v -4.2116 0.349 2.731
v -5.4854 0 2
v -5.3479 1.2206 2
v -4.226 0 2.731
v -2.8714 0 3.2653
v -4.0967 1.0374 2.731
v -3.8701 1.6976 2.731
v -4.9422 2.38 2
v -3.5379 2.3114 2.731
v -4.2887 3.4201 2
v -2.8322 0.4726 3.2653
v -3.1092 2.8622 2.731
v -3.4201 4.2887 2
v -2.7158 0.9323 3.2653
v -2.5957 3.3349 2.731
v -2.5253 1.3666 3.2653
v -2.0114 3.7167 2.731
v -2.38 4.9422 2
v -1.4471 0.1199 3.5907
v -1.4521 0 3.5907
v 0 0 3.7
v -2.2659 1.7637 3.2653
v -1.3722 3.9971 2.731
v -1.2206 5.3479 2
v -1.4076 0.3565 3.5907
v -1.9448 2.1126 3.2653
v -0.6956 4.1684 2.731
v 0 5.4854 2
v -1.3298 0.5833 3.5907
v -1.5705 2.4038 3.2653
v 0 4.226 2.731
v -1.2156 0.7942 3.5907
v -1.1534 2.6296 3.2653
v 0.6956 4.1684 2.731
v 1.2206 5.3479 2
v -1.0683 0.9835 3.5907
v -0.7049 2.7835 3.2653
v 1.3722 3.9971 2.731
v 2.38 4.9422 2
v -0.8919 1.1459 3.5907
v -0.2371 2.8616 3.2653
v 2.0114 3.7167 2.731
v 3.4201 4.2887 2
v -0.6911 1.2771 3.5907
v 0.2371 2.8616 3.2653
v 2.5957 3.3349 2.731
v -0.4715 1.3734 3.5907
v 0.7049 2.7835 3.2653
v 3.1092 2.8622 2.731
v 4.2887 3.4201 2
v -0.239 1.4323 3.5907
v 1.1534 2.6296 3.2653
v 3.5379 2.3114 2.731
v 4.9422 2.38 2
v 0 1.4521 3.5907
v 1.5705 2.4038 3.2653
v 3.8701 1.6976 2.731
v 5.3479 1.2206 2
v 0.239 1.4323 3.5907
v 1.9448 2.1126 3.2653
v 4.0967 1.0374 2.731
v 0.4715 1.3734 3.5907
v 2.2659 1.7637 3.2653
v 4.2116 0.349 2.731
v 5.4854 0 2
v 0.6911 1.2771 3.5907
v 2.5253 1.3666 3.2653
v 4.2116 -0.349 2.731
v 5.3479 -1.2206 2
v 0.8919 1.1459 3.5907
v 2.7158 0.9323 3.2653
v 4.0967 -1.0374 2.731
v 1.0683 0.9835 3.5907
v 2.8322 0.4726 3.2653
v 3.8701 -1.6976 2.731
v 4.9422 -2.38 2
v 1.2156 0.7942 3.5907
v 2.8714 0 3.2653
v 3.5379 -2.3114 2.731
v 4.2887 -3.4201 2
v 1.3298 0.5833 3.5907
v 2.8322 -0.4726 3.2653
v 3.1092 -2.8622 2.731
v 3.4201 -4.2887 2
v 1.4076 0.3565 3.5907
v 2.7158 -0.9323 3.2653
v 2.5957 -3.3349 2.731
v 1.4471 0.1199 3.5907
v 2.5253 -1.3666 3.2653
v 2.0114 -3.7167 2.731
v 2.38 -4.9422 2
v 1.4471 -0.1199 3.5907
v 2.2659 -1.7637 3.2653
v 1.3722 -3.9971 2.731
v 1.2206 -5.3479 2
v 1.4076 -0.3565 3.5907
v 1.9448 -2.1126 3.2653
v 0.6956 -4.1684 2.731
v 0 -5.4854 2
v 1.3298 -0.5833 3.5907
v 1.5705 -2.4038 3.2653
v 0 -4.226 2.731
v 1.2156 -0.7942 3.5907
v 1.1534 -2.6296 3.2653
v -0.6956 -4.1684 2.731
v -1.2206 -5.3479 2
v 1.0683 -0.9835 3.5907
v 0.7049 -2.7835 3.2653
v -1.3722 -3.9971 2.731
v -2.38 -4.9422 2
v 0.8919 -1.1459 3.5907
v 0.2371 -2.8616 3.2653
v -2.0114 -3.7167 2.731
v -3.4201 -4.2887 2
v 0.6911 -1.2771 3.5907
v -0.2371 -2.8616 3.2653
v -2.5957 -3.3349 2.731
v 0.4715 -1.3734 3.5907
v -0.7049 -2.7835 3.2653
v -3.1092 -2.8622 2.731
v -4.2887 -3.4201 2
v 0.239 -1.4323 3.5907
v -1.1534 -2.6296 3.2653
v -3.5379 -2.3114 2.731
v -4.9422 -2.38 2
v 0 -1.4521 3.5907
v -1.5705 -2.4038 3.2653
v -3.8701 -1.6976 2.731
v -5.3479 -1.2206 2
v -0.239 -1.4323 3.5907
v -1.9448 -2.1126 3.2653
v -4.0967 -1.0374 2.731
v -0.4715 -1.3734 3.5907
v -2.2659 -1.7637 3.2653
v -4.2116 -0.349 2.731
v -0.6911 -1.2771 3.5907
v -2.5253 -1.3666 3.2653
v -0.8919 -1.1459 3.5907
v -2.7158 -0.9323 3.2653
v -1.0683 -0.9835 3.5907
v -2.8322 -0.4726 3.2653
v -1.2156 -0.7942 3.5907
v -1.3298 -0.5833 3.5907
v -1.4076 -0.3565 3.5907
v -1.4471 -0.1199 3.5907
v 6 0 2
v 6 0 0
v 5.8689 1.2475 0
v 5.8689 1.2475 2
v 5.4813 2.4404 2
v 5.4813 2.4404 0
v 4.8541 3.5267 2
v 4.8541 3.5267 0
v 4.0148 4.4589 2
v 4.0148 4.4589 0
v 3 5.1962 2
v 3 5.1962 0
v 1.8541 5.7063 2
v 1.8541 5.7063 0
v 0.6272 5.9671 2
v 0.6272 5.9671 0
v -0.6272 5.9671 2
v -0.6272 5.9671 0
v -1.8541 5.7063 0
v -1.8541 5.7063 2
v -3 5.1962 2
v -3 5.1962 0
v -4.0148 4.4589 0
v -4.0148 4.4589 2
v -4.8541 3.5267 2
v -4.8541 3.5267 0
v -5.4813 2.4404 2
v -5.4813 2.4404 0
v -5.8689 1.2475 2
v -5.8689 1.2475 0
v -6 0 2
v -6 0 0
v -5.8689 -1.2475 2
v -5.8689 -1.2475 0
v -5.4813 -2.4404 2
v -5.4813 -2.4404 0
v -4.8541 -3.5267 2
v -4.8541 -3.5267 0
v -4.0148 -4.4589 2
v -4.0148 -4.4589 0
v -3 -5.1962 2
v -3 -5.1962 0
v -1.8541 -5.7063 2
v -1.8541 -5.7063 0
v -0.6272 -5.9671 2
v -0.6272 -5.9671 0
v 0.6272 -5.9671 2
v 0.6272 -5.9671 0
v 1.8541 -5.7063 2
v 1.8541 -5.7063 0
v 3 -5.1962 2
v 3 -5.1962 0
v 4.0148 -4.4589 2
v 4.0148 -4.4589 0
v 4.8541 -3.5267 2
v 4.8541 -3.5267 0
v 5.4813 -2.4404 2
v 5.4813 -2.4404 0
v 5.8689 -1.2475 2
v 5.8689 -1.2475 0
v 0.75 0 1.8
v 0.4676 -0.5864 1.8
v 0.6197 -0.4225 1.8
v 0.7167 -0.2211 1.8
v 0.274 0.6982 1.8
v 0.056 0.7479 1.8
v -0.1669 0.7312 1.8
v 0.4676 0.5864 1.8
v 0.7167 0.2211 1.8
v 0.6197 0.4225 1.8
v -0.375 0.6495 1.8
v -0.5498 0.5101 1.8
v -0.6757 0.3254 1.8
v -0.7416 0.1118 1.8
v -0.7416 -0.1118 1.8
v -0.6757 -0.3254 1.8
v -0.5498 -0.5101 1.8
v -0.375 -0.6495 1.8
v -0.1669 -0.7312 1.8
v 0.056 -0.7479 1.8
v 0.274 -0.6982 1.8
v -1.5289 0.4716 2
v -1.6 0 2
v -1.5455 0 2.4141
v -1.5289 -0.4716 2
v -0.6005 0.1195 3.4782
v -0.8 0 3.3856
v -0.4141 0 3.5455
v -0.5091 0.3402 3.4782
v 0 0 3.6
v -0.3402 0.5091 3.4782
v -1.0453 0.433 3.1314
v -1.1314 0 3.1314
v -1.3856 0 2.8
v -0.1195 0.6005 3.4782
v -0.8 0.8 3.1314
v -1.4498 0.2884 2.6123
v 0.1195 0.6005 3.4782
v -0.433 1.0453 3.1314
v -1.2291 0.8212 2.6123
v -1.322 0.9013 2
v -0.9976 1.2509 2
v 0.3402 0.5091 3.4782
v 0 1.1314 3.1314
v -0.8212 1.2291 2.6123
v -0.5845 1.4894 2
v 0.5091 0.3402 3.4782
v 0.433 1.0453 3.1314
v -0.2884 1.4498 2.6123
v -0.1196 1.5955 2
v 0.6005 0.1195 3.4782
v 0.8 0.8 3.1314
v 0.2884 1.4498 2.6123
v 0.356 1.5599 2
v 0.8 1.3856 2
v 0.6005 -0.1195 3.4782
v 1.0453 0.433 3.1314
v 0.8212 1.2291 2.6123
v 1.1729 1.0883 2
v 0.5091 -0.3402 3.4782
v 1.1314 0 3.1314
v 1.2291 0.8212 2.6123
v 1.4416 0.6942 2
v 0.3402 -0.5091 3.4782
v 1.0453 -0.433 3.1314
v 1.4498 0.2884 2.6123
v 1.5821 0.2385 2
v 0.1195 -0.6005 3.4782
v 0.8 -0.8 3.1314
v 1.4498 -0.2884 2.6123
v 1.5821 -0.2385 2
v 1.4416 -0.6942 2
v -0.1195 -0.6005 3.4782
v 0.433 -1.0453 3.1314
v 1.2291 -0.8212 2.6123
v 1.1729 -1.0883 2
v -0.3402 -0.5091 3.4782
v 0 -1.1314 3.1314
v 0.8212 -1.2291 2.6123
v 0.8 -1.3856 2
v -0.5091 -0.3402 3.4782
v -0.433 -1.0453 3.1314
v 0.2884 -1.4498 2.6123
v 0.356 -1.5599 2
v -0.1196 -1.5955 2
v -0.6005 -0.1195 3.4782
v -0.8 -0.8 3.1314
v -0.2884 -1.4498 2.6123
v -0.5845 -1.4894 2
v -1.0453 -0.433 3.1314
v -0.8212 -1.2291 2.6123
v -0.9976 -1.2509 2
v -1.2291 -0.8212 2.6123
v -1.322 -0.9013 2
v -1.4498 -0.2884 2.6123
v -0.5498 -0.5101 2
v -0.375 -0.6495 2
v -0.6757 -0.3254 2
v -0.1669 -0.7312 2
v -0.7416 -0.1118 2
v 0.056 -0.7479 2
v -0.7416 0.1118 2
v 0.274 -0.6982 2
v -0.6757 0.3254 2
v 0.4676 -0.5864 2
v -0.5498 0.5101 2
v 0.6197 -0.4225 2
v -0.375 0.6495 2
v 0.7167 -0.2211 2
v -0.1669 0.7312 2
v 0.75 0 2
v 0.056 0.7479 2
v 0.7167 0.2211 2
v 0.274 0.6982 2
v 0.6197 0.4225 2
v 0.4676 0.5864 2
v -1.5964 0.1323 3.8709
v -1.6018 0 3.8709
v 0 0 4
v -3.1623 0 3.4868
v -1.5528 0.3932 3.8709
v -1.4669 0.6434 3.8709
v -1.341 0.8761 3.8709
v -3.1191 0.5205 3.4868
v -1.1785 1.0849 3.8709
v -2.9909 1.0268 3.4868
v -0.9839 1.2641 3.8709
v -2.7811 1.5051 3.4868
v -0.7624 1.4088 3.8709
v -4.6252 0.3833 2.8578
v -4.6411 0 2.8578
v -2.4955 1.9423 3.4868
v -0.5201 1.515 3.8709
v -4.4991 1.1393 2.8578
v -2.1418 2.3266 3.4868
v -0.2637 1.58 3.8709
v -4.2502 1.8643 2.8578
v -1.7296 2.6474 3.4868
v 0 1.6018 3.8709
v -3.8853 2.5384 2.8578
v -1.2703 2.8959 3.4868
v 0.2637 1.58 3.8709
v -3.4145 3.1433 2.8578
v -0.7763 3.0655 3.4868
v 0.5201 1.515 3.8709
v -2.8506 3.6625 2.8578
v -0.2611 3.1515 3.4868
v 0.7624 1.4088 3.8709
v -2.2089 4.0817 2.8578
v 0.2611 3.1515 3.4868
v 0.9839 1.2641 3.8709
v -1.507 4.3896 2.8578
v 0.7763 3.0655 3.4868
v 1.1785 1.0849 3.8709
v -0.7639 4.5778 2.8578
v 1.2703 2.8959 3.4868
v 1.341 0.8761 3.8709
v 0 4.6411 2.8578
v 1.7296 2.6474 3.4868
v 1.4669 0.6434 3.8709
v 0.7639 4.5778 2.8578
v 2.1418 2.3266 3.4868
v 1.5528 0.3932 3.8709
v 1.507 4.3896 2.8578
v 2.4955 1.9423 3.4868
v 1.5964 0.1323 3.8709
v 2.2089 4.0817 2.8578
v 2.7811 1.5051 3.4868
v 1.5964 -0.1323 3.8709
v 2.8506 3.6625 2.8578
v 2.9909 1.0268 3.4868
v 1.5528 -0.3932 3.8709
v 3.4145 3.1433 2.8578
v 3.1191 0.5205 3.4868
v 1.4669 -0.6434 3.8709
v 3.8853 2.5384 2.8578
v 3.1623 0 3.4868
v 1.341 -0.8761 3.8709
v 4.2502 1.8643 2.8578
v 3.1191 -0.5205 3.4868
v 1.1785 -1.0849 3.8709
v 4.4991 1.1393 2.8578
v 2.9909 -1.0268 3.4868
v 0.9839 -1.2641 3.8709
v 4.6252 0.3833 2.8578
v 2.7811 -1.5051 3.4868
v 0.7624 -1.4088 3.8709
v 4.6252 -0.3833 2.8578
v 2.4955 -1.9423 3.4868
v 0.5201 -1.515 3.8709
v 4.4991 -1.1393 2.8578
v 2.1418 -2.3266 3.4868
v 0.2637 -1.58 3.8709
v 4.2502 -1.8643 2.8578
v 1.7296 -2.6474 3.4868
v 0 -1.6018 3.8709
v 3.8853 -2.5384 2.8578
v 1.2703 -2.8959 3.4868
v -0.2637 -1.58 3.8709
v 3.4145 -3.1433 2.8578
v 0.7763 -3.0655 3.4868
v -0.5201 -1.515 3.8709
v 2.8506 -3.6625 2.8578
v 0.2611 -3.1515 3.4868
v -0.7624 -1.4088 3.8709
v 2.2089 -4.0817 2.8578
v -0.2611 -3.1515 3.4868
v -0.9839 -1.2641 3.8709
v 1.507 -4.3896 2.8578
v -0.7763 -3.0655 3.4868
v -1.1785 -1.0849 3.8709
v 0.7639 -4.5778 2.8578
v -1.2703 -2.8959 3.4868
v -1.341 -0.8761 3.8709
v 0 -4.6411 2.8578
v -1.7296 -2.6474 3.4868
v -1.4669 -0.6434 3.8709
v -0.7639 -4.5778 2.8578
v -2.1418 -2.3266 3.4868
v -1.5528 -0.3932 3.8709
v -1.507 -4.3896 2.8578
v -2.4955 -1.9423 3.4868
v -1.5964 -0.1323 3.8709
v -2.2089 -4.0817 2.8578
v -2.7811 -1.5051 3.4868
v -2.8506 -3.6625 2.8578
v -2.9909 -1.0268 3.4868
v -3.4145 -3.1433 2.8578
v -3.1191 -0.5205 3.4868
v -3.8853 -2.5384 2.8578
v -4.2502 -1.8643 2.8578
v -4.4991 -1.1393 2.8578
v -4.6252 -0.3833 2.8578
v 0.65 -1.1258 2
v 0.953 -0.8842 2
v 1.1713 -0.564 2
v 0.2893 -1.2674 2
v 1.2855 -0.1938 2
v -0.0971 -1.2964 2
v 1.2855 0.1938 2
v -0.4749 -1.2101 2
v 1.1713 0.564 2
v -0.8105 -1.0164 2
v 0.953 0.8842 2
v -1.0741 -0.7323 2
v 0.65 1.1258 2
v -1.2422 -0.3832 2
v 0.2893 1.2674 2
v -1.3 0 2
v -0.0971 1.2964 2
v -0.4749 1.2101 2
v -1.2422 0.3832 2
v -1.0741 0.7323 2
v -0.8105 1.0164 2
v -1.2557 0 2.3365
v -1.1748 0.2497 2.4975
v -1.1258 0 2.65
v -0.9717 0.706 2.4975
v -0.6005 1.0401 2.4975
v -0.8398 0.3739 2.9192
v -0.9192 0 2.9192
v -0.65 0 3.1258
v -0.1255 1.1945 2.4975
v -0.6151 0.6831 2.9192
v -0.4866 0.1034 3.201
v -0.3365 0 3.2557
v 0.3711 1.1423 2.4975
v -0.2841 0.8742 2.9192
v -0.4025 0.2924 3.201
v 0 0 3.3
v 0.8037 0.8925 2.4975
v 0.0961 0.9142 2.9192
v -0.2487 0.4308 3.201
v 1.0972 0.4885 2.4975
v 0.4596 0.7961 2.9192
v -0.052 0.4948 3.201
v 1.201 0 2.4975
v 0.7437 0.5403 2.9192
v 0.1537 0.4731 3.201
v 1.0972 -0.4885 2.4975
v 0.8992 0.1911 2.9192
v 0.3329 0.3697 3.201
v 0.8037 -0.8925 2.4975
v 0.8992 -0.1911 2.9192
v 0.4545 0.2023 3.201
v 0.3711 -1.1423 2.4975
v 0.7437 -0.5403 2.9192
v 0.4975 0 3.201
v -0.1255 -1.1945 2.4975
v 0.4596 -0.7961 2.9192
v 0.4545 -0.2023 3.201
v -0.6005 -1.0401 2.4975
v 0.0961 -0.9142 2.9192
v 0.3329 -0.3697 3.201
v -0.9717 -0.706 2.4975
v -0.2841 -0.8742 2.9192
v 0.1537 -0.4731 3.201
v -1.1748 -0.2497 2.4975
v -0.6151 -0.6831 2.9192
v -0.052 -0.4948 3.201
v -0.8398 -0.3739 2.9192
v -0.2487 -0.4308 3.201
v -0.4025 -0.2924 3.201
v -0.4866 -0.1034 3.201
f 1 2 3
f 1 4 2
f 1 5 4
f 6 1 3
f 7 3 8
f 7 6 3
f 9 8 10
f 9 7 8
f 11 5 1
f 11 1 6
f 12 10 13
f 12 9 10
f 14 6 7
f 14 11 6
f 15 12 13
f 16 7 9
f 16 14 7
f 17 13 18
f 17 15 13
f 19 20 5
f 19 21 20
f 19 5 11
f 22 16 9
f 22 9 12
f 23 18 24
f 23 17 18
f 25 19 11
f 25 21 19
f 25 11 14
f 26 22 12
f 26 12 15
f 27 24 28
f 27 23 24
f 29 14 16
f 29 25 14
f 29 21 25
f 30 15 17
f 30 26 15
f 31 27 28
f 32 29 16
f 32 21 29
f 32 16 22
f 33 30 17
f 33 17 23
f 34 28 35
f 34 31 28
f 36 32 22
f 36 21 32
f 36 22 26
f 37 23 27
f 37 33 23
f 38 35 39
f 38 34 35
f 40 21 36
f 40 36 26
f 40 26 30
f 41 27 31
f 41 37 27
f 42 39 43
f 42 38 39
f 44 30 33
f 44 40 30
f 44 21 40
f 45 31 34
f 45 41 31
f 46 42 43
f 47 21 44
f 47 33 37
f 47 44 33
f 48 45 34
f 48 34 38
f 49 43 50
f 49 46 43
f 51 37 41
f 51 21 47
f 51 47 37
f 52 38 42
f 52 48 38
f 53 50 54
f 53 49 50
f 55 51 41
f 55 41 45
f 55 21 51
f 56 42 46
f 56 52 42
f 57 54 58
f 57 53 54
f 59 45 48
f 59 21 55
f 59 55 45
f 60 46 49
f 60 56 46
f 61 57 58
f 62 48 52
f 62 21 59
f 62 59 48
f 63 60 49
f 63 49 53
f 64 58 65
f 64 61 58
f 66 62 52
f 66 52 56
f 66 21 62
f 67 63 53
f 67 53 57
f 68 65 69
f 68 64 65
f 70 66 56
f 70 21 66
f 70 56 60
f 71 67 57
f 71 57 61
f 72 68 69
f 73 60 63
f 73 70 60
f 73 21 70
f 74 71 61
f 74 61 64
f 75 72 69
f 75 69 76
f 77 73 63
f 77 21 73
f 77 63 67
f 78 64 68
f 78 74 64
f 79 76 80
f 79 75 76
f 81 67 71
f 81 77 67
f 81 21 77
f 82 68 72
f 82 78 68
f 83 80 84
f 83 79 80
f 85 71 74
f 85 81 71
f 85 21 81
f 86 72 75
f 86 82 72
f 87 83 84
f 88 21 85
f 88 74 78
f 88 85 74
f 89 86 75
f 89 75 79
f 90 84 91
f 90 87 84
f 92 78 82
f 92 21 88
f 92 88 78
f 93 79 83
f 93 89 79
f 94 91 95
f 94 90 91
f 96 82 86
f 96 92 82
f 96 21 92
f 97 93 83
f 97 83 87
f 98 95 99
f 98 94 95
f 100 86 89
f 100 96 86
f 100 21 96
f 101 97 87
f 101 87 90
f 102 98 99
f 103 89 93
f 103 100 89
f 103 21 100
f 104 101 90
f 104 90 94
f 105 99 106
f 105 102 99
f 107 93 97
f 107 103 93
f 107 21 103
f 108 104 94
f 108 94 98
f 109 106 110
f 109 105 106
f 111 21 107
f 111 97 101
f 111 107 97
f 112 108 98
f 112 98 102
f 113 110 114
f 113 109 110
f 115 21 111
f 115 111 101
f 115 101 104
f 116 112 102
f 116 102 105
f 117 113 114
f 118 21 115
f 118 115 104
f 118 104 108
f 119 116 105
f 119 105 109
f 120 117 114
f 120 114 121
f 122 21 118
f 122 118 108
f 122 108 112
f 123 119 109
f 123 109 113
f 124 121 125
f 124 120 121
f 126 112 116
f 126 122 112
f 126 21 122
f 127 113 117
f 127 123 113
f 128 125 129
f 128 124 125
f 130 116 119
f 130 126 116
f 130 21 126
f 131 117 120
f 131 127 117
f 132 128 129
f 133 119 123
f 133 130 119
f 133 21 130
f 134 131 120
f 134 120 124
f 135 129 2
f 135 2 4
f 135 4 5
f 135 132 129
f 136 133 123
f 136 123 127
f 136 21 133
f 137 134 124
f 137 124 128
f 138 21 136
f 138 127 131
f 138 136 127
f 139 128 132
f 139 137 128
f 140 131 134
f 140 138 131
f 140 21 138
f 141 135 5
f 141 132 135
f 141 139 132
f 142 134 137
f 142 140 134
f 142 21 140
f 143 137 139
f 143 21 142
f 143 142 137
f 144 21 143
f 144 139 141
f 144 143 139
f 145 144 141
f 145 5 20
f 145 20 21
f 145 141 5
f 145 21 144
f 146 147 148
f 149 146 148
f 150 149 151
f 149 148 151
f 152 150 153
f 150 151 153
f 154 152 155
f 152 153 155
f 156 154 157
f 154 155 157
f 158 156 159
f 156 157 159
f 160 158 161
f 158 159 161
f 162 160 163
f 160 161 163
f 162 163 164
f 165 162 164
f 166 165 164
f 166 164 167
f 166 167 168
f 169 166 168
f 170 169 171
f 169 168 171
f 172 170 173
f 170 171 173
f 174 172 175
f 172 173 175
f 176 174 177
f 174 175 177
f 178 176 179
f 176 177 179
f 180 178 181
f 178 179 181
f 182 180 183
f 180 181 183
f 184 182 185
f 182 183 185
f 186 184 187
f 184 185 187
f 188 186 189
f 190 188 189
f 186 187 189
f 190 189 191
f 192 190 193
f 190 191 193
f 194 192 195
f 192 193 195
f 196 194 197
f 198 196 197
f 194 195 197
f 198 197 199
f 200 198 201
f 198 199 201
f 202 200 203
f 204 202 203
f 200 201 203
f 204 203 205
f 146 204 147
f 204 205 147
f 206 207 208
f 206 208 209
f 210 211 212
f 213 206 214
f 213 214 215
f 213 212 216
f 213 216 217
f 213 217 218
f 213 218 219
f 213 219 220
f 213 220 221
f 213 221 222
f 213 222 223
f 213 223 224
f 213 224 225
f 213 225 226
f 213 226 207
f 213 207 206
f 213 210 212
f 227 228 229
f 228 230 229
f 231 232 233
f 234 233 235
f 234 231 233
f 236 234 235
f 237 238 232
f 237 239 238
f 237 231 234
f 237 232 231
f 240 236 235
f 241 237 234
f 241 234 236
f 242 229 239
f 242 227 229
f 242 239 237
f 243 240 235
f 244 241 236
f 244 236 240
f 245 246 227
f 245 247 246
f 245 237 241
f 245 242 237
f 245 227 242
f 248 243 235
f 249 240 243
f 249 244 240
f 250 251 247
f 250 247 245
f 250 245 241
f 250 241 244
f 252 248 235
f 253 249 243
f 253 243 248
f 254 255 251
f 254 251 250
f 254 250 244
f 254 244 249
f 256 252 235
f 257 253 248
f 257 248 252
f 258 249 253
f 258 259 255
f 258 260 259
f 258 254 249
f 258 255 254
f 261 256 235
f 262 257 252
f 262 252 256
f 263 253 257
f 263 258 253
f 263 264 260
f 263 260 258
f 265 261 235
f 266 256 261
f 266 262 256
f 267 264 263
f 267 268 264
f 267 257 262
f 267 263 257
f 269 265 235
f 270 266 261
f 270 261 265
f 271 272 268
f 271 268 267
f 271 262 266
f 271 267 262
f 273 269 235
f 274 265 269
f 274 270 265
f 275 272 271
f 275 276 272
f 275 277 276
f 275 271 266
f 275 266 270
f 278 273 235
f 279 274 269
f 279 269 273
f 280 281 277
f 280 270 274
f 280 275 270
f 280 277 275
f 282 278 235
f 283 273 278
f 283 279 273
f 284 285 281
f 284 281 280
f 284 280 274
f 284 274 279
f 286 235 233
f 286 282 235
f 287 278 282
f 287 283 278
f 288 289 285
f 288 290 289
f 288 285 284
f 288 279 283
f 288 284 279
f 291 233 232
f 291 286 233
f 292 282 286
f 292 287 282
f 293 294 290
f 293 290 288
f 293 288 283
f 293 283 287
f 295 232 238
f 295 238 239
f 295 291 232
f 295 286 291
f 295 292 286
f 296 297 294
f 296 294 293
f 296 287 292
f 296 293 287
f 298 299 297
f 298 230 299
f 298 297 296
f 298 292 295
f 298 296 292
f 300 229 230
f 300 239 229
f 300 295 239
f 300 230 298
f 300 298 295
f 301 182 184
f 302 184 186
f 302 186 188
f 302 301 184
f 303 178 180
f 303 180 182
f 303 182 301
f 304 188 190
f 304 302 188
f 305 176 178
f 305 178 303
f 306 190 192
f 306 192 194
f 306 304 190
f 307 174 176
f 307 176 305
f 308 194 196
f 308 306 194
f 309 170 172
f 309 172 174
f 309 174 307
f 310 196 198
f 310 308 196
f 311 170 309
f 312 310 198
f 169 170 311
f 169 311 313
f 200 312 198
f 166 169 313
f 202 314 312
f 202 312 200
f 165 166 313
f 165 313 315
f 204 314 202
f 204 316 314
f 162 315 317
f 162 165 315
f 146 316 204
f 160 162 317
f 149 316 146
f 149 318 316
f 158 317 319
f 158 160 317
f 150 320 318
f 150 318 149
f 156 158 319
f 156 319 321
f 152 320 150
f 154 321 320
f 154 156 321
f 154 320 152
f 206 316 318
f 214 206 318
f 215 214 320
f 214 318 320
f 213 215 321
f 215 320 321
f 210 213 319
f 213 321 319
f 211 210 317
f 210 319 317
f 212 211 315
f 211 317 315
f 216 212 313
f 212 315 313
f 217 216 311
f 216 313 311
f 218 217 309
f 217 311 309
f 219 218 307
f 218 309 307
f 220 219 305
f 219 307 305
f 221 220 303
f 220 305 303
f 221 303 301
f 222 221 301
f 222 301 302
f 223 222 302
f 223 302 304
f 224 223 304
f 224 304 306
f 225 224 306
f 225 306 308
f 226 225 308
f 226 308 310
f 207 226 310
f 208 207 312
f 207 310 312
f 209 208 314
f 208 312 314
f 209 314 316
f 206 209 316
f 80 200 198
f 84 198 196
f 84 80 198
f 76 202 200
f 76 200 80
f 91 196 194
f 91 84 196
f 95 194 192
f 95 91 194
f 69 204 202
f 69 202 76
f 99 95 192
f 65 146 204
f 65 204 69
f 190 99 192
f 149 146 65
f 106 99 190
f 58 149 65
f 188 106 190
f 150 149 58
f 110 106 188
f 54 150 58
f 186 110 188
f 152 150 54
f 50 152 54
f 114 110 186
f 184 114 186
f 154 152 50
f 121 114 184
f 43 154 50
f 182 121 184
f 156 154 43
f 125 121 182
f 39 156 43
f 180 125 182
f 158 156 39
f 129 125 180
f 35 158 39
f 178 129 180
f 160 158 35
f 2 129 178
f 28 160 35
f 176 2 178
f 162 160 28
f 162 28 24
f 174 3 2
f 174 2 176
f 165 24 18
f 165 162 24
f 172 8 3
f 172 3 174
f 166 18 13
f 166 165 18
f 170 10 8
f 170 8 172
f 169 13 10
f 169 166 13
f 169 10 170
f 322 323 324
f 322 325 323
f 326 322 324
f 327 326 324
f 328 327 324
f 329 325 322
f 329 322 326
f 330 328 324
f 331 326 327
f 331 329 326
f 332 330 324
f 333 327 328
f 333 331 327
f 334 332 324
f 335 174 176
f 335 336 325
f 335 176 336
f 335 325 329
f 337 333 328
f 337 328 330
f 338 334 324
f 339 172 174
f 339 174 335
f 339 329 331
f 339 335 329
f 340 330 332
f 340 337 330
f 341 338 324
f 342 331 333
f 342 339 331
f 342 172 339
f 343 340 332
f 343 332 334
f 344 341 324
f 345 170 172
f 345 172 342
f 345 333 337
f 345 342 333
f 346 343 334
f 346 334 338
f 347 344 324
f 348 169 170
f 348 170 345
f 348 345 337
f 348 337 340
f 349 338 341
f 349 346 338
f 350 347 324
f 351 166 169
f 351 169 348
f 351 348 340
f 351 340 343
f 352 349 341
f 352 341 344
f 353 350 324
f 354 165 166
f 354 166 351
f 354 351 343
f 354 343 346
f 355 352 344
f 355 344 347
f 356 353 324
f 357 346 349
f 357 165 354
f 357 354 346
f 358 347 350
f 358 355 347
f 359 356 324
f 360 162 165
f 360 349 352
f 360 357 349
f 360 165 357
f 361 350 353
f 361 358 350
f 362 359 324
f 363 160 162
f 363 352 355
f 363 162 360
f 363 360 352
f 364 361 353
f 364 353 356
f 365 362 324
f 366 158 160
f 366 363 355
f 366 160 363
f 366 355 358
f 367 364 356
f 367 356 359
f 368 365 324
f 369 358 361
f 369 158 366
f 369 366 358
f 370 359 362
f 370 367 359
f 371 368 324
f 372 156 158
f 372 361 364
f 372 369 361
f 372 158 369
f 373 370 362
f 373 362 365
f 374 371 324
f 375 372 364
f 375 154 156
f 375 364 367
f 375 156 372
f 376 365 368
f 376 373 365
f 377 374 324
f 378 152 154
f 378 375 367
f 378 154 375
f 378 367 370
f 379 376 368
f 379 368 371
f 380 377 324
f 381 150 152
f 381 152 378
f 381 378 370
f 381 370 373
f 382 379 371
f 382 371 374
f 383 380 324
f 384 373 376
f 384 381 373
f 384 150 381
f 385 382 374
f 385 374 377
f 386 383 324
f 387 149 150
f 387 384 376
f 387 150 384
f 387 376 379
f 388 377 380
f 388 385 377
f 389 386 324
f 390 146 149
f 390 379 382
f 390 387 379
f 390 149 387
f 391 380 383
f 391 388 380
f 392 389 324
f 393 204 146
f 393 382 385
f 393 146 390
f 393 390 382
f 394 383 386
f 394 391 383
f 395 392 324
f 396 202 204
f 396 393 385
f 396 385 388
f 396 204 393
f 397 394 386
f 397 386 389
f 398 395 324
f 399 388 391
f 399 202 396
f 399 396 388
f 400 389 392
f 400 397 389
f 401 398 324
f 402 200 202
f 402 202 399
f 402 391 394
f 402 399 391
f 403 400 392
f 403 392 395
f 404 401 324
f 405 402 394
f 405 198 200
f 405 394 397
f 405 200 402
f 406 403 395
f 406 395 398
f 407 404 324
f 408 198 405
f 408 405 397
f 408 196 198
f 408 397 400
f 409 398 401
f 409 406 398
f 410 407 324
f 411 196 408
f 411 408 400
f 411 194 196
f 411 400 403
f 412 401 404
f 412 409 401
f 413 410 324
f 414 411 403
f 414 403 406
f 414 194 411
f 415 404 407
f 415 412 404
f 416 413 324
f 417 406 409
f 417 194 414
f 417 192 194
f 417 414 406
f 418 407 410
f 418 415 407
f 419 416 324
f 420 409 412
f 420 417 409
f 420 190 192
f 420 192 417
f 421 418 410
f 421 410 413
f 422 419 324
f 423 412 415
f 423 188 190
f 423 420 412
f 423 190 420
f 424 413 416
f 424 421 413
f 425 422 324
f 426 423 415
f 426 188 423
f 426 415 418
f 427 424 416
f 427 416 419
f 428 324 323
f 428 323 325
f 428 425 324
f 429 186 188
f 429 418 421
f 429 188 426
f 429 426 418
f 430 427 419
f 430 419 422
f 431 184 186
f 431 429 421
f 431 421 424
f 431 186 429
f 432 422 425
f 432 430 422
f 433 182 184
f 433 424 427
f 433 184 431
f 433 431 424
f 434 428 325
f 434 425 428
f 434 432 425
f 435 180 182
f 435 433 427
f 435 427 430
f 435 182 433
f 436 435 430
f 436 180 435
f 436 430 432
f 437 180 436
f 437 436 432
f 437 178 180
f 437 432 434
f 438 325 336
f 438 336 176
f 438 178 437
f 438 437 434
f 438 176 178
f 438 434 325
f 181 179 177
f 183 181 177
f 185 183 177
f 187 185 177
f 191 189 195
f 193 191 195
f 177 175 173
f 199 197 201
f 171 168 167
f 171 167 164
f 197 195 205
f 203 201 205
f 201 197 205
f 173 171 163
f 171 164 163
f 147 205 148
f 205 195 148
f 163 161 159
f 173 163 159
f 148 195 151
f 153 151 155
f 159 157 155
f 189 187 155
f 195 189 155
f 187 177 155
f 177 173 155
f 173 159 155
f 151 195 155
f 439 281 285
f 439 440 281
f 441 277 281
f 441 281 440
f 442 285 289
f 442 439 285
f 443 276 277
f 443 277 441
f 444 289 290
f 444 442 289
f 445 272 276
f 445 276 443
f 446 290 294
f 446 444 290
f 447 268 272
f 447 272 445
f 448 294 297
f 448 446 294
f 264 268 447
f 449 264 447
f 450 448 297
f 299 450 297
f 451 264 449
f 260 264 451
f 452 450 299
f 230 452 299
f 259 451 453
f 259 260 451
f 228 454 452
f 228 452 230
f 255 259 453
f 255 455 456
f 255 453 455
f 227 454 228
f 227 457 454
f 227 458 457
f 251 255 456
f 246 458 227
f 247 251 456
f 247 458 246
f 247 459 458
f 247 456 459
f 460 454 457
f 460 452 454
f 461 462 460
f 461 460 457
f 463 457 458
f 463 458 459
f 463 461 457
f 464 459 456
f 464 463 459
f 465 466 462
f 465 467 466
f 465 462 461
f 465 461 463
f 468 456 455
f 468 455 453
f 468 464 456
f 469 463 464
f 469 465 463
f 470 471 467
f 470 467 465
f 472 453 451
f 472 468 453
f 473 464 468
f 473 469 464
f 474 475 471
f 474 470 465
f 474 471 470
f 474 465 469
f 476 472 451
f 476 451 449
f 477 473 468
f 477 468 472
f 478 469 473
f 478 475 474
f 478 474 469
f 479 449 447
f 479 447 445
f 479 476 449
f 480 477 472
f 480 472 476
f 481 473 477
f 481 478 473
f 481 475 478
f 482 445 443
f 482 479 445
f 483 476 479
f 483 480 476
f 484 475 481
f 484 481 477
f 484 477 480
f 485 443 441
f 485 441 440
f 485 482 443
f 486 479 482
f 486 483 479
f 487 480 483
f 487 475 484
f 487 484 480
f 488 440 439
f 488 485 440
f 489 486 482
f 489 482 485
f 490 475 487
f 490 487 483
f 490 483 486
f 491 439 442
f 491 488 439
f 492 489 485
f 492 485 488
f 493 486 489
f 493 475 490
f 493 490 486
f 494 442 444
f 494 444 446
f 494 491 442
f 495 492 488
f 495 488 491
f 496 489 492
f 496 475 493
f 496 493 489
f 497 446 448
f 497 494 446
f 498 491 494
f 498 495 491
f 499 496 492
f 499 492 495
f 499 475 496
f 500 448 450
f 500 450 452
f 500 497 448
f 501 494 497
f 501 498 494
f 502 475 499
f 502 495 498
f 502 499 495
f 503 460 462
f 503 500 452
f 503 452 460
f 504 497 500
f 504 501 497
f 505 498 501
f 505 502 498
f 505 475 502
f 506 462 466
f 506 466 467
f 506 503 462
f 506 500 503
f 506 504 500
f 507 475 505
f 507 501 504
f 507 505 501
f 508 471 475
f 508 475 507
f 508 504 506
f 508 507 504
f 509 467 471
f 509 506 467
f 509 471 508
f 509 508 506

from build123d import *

# Parameters (mm, degrees)
SKETCH1_R           = 6
BOSS_EXTRUDE1_DEPTH = 2
SKETCH4_R           = 0.75
CUT_EXTRUDE1_DEPTH  = 0.2


with BuildPart() as part:
    # Sketch1 → Boss-Extrude1 (new body)
    with BuildSketch(Plane.XY):
        Circle(SKETCH1_R)
    extrude(amount=BOSS_EXTRUDE1_DEPTH)

    # Sketch4 → Cut-Extrude1 (cut)
    with BuildSketch(Plane.XY.offset(2)):
        Circle(SKETCH4_R)
    extrude(amount=-CUT_EXTRUDE1_DEPTH, mode=Mode.SUBTRACT)


with BuildPart() as body_2:
    # Sketch2 → Revolve1 (revolve)
    with BuildSketch(Plane(origin=(0, 0, 0), x_dir=(1, 0, 0), z_dir=(0, 1, 0))):
        with BuildLine():
            Line((-6, -2), (-5.485435261, -2))
            ThreePointArc((-5.485435261, -2), (-2.871410803, -3.265257687), (0, -3.7))
            Line((0, -3.7), (0, -4))
            ThreePointArc((0, -4), (-3.16227766, -3.486832981), (-6, -2))
        make_face()
    revolve(axis=Axis((0, 0, 0), (0, 0, -1)))


with BuildPart() as body_3:
    # Sketch3 → Revolve2 (revolve)
    with BuildSketch(Plane(origin=(0, 0, 0), x_dir=(1, 0, 0), z_dir=(0, 1, 0))):
        with BuildLine():
            Line((-1.6, -2), (-1.3, -2))
            ThreePointArc((-1.3, -2), (-0.919238816, -2.919238816), (0, -3.3))
            Line((0, -3.3), (0, -3.6))
            ThreePointArc((0, -3.6), (-1.13137085, -3.13137085), (-1.6, -2))
        make_face()
    revolve(axis=Axis((0, 0, 0), (0, 0, -1)))


solid = Compound([part.part, body_2.part, body_3.part])
